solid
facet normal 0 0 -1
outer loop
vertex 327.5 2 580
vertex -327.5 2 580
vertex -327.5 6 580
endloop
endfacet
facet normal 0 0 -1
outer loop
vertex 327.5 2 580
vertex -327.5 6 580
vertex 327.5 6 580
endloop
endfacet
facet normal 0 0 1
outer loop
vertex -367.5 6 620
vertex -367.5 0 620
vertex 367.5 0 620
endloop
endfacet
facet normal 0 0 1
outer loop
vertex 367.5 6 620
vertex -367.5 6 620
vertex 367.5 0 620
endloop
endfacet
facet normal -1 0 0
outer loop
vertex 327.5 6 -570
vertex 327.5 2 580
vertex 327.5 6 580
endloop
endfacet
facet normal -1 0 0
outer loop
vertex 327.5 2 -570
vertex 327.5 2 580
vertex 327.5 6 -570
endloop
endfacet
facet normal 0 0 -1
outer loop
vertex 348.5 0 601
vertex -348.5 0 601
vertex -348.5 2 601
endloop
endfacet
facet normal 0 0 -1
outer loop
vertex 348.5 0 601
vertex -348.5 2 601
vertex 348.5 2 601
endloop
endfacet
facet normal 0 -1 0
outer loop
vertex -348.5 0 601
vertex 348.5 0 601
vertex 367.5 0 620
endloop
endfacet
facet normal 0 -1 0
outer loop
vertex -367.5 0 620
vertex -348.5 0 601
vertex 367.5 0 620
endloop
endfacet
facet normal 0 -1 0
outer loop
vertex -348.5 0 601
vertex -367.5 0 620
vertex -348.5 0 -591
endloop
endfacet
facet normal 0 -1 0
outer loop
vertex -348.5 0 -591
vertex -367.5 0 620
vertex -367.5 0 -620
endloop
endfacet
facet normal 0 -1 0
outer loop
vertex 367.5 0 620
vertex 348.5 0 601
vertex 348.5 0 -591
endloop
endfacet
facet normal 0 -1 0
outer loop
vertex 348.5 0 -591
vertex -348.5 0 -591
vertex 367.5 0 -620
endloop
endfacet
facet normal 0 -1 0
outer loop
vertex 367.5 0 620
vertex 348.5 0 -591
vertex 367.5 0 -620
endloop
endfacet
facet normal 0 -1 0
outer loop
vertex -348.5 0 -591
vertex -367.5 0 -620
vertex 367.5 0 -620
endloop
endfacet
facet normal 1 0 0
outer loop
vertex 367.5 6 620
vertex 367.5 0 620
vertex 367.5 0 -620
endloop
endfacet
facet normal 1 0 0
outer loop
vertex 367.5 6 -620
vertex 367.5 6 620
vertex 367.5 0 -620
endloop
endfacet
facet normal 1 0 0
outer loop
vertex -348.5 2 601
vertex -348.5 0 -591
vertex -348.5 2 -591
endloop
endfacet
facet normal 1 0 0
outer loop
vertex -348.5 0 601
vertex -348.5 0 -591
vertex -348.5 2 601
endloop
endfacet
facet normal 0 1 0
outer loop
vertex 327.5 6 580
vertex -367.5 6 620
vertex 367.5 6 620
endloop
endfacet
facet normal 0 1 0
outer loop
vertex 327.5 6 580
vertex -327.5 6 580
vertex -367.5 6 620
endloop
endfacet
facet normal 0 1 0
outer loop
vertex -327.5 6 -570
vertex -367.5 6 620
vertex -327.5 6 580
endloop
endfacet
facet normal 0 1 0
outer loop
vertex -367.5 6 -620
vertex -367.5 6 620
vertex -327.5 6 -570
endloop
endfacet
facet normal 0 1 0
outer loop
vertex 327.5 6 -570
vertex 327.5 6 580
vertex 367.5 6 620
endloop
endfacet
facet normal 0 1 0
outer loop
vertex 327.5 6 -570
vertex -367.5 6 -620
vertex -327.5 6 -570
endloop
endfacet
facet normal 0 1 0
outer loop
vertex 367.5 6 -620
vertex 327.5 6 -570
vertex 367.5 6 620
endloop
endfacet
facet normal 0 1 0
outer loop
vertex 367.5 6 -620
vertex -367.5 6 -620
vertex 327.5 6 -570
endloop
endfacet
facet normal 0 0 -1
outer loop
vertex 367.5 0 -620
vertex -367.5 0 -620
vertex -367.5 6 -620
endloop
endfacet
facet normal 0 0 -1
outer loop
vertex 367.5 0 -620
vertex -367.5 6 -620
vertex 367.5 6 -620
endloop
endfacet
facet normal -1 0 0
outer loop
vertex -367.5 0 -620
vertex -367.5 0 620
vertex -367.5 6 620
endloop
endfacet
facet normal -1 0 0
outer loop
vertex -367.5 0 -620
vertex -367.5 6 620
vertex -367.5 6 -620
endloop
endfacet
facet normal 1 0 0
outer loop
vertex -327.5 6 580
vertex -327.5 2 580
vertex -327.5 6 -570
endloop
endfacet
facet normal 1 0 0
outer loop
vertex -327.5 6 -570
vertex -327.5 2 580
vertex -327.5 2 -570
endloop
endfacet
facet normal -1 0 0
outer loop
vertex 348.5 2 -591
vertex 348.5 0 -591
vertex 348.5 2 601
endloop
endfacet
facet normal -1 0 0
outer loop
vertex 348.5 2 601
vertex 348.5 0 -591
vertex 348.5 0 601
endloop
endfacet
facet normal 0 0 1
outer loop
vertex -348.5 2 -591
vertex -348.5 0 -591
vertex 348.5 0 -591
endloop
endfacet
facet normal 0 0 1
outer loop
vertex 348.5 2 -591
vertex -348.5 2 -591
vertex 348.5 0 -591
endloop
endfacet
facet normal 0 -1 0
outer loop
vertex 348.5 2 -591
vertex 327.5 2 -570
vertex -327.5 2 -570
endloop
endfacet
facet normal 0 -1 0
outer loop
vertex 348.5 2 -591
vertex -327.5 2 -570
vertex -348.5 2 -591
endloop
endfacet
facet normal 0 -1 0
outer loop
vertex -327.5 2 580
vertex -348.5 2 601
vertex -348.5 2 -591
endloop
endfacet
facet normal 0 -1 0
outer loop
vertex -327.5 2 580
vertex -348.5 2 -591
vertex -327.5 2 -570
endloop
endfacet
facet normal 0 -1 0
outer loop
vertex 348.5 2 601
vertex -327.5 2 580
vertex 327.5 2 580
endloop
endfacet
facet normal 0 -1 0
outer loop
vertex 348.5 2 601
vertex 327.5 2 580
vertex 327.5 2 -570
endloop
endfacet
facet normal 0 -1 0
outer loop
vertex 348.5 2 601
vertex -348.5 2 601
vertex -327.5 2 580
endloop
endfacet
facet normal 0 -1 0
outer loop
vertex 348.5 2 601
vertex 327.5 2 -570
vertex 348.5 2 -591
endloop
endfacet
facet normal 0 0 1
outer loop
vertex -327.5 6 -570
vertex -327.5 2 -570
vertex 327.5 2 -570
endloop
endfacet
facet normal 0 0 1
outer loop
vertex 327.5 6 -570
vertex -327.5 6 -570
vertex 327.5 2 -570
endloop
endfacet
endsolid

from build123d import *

# Parameters (mm, degrees)
SKETCH1_W           = 735
SKETCH1_H           = 1240
SKETCH1_W_2         = 655
SKETCH1_H_2         = 1150
BOSS_EXTRUDE1_DEPTH = 6
SKETCH2_W           = 697
SKETCH2_H           = 1192
CUT_EXTRUDE1_DEPTH  = 2


with BuildPart() as part:
    # Sketch1 → Boss-Extrude1 (new body)
    with BuildSketch(Plane(origin=(0, 0, 0), x_dir=(1, 0, 0), z_dir=(0, 1, 0))):
        Rectangle(SKETCH1_W, SKETCH1_H)
        with Locations((0, -5)):
            Rectangle(SKETCH1_W_2, SKETCH1_H_2, mode=Mode.SUBTRACT)
    extrude(amount=BOSS_EXTRUDE1_DEPTH)

    # Sketch2 → Cut-Extrude1 (cut)
    with BuildSketch(Plane.XZ):
        with Locations((0, 5)):
            Rectangle(SKETCH2_W, SKETCH2_H)
    extrude(amount=-CUT_EXTRUDE1_DEPTH, mode=Mode.SUBTRACT)


solid = part.part
